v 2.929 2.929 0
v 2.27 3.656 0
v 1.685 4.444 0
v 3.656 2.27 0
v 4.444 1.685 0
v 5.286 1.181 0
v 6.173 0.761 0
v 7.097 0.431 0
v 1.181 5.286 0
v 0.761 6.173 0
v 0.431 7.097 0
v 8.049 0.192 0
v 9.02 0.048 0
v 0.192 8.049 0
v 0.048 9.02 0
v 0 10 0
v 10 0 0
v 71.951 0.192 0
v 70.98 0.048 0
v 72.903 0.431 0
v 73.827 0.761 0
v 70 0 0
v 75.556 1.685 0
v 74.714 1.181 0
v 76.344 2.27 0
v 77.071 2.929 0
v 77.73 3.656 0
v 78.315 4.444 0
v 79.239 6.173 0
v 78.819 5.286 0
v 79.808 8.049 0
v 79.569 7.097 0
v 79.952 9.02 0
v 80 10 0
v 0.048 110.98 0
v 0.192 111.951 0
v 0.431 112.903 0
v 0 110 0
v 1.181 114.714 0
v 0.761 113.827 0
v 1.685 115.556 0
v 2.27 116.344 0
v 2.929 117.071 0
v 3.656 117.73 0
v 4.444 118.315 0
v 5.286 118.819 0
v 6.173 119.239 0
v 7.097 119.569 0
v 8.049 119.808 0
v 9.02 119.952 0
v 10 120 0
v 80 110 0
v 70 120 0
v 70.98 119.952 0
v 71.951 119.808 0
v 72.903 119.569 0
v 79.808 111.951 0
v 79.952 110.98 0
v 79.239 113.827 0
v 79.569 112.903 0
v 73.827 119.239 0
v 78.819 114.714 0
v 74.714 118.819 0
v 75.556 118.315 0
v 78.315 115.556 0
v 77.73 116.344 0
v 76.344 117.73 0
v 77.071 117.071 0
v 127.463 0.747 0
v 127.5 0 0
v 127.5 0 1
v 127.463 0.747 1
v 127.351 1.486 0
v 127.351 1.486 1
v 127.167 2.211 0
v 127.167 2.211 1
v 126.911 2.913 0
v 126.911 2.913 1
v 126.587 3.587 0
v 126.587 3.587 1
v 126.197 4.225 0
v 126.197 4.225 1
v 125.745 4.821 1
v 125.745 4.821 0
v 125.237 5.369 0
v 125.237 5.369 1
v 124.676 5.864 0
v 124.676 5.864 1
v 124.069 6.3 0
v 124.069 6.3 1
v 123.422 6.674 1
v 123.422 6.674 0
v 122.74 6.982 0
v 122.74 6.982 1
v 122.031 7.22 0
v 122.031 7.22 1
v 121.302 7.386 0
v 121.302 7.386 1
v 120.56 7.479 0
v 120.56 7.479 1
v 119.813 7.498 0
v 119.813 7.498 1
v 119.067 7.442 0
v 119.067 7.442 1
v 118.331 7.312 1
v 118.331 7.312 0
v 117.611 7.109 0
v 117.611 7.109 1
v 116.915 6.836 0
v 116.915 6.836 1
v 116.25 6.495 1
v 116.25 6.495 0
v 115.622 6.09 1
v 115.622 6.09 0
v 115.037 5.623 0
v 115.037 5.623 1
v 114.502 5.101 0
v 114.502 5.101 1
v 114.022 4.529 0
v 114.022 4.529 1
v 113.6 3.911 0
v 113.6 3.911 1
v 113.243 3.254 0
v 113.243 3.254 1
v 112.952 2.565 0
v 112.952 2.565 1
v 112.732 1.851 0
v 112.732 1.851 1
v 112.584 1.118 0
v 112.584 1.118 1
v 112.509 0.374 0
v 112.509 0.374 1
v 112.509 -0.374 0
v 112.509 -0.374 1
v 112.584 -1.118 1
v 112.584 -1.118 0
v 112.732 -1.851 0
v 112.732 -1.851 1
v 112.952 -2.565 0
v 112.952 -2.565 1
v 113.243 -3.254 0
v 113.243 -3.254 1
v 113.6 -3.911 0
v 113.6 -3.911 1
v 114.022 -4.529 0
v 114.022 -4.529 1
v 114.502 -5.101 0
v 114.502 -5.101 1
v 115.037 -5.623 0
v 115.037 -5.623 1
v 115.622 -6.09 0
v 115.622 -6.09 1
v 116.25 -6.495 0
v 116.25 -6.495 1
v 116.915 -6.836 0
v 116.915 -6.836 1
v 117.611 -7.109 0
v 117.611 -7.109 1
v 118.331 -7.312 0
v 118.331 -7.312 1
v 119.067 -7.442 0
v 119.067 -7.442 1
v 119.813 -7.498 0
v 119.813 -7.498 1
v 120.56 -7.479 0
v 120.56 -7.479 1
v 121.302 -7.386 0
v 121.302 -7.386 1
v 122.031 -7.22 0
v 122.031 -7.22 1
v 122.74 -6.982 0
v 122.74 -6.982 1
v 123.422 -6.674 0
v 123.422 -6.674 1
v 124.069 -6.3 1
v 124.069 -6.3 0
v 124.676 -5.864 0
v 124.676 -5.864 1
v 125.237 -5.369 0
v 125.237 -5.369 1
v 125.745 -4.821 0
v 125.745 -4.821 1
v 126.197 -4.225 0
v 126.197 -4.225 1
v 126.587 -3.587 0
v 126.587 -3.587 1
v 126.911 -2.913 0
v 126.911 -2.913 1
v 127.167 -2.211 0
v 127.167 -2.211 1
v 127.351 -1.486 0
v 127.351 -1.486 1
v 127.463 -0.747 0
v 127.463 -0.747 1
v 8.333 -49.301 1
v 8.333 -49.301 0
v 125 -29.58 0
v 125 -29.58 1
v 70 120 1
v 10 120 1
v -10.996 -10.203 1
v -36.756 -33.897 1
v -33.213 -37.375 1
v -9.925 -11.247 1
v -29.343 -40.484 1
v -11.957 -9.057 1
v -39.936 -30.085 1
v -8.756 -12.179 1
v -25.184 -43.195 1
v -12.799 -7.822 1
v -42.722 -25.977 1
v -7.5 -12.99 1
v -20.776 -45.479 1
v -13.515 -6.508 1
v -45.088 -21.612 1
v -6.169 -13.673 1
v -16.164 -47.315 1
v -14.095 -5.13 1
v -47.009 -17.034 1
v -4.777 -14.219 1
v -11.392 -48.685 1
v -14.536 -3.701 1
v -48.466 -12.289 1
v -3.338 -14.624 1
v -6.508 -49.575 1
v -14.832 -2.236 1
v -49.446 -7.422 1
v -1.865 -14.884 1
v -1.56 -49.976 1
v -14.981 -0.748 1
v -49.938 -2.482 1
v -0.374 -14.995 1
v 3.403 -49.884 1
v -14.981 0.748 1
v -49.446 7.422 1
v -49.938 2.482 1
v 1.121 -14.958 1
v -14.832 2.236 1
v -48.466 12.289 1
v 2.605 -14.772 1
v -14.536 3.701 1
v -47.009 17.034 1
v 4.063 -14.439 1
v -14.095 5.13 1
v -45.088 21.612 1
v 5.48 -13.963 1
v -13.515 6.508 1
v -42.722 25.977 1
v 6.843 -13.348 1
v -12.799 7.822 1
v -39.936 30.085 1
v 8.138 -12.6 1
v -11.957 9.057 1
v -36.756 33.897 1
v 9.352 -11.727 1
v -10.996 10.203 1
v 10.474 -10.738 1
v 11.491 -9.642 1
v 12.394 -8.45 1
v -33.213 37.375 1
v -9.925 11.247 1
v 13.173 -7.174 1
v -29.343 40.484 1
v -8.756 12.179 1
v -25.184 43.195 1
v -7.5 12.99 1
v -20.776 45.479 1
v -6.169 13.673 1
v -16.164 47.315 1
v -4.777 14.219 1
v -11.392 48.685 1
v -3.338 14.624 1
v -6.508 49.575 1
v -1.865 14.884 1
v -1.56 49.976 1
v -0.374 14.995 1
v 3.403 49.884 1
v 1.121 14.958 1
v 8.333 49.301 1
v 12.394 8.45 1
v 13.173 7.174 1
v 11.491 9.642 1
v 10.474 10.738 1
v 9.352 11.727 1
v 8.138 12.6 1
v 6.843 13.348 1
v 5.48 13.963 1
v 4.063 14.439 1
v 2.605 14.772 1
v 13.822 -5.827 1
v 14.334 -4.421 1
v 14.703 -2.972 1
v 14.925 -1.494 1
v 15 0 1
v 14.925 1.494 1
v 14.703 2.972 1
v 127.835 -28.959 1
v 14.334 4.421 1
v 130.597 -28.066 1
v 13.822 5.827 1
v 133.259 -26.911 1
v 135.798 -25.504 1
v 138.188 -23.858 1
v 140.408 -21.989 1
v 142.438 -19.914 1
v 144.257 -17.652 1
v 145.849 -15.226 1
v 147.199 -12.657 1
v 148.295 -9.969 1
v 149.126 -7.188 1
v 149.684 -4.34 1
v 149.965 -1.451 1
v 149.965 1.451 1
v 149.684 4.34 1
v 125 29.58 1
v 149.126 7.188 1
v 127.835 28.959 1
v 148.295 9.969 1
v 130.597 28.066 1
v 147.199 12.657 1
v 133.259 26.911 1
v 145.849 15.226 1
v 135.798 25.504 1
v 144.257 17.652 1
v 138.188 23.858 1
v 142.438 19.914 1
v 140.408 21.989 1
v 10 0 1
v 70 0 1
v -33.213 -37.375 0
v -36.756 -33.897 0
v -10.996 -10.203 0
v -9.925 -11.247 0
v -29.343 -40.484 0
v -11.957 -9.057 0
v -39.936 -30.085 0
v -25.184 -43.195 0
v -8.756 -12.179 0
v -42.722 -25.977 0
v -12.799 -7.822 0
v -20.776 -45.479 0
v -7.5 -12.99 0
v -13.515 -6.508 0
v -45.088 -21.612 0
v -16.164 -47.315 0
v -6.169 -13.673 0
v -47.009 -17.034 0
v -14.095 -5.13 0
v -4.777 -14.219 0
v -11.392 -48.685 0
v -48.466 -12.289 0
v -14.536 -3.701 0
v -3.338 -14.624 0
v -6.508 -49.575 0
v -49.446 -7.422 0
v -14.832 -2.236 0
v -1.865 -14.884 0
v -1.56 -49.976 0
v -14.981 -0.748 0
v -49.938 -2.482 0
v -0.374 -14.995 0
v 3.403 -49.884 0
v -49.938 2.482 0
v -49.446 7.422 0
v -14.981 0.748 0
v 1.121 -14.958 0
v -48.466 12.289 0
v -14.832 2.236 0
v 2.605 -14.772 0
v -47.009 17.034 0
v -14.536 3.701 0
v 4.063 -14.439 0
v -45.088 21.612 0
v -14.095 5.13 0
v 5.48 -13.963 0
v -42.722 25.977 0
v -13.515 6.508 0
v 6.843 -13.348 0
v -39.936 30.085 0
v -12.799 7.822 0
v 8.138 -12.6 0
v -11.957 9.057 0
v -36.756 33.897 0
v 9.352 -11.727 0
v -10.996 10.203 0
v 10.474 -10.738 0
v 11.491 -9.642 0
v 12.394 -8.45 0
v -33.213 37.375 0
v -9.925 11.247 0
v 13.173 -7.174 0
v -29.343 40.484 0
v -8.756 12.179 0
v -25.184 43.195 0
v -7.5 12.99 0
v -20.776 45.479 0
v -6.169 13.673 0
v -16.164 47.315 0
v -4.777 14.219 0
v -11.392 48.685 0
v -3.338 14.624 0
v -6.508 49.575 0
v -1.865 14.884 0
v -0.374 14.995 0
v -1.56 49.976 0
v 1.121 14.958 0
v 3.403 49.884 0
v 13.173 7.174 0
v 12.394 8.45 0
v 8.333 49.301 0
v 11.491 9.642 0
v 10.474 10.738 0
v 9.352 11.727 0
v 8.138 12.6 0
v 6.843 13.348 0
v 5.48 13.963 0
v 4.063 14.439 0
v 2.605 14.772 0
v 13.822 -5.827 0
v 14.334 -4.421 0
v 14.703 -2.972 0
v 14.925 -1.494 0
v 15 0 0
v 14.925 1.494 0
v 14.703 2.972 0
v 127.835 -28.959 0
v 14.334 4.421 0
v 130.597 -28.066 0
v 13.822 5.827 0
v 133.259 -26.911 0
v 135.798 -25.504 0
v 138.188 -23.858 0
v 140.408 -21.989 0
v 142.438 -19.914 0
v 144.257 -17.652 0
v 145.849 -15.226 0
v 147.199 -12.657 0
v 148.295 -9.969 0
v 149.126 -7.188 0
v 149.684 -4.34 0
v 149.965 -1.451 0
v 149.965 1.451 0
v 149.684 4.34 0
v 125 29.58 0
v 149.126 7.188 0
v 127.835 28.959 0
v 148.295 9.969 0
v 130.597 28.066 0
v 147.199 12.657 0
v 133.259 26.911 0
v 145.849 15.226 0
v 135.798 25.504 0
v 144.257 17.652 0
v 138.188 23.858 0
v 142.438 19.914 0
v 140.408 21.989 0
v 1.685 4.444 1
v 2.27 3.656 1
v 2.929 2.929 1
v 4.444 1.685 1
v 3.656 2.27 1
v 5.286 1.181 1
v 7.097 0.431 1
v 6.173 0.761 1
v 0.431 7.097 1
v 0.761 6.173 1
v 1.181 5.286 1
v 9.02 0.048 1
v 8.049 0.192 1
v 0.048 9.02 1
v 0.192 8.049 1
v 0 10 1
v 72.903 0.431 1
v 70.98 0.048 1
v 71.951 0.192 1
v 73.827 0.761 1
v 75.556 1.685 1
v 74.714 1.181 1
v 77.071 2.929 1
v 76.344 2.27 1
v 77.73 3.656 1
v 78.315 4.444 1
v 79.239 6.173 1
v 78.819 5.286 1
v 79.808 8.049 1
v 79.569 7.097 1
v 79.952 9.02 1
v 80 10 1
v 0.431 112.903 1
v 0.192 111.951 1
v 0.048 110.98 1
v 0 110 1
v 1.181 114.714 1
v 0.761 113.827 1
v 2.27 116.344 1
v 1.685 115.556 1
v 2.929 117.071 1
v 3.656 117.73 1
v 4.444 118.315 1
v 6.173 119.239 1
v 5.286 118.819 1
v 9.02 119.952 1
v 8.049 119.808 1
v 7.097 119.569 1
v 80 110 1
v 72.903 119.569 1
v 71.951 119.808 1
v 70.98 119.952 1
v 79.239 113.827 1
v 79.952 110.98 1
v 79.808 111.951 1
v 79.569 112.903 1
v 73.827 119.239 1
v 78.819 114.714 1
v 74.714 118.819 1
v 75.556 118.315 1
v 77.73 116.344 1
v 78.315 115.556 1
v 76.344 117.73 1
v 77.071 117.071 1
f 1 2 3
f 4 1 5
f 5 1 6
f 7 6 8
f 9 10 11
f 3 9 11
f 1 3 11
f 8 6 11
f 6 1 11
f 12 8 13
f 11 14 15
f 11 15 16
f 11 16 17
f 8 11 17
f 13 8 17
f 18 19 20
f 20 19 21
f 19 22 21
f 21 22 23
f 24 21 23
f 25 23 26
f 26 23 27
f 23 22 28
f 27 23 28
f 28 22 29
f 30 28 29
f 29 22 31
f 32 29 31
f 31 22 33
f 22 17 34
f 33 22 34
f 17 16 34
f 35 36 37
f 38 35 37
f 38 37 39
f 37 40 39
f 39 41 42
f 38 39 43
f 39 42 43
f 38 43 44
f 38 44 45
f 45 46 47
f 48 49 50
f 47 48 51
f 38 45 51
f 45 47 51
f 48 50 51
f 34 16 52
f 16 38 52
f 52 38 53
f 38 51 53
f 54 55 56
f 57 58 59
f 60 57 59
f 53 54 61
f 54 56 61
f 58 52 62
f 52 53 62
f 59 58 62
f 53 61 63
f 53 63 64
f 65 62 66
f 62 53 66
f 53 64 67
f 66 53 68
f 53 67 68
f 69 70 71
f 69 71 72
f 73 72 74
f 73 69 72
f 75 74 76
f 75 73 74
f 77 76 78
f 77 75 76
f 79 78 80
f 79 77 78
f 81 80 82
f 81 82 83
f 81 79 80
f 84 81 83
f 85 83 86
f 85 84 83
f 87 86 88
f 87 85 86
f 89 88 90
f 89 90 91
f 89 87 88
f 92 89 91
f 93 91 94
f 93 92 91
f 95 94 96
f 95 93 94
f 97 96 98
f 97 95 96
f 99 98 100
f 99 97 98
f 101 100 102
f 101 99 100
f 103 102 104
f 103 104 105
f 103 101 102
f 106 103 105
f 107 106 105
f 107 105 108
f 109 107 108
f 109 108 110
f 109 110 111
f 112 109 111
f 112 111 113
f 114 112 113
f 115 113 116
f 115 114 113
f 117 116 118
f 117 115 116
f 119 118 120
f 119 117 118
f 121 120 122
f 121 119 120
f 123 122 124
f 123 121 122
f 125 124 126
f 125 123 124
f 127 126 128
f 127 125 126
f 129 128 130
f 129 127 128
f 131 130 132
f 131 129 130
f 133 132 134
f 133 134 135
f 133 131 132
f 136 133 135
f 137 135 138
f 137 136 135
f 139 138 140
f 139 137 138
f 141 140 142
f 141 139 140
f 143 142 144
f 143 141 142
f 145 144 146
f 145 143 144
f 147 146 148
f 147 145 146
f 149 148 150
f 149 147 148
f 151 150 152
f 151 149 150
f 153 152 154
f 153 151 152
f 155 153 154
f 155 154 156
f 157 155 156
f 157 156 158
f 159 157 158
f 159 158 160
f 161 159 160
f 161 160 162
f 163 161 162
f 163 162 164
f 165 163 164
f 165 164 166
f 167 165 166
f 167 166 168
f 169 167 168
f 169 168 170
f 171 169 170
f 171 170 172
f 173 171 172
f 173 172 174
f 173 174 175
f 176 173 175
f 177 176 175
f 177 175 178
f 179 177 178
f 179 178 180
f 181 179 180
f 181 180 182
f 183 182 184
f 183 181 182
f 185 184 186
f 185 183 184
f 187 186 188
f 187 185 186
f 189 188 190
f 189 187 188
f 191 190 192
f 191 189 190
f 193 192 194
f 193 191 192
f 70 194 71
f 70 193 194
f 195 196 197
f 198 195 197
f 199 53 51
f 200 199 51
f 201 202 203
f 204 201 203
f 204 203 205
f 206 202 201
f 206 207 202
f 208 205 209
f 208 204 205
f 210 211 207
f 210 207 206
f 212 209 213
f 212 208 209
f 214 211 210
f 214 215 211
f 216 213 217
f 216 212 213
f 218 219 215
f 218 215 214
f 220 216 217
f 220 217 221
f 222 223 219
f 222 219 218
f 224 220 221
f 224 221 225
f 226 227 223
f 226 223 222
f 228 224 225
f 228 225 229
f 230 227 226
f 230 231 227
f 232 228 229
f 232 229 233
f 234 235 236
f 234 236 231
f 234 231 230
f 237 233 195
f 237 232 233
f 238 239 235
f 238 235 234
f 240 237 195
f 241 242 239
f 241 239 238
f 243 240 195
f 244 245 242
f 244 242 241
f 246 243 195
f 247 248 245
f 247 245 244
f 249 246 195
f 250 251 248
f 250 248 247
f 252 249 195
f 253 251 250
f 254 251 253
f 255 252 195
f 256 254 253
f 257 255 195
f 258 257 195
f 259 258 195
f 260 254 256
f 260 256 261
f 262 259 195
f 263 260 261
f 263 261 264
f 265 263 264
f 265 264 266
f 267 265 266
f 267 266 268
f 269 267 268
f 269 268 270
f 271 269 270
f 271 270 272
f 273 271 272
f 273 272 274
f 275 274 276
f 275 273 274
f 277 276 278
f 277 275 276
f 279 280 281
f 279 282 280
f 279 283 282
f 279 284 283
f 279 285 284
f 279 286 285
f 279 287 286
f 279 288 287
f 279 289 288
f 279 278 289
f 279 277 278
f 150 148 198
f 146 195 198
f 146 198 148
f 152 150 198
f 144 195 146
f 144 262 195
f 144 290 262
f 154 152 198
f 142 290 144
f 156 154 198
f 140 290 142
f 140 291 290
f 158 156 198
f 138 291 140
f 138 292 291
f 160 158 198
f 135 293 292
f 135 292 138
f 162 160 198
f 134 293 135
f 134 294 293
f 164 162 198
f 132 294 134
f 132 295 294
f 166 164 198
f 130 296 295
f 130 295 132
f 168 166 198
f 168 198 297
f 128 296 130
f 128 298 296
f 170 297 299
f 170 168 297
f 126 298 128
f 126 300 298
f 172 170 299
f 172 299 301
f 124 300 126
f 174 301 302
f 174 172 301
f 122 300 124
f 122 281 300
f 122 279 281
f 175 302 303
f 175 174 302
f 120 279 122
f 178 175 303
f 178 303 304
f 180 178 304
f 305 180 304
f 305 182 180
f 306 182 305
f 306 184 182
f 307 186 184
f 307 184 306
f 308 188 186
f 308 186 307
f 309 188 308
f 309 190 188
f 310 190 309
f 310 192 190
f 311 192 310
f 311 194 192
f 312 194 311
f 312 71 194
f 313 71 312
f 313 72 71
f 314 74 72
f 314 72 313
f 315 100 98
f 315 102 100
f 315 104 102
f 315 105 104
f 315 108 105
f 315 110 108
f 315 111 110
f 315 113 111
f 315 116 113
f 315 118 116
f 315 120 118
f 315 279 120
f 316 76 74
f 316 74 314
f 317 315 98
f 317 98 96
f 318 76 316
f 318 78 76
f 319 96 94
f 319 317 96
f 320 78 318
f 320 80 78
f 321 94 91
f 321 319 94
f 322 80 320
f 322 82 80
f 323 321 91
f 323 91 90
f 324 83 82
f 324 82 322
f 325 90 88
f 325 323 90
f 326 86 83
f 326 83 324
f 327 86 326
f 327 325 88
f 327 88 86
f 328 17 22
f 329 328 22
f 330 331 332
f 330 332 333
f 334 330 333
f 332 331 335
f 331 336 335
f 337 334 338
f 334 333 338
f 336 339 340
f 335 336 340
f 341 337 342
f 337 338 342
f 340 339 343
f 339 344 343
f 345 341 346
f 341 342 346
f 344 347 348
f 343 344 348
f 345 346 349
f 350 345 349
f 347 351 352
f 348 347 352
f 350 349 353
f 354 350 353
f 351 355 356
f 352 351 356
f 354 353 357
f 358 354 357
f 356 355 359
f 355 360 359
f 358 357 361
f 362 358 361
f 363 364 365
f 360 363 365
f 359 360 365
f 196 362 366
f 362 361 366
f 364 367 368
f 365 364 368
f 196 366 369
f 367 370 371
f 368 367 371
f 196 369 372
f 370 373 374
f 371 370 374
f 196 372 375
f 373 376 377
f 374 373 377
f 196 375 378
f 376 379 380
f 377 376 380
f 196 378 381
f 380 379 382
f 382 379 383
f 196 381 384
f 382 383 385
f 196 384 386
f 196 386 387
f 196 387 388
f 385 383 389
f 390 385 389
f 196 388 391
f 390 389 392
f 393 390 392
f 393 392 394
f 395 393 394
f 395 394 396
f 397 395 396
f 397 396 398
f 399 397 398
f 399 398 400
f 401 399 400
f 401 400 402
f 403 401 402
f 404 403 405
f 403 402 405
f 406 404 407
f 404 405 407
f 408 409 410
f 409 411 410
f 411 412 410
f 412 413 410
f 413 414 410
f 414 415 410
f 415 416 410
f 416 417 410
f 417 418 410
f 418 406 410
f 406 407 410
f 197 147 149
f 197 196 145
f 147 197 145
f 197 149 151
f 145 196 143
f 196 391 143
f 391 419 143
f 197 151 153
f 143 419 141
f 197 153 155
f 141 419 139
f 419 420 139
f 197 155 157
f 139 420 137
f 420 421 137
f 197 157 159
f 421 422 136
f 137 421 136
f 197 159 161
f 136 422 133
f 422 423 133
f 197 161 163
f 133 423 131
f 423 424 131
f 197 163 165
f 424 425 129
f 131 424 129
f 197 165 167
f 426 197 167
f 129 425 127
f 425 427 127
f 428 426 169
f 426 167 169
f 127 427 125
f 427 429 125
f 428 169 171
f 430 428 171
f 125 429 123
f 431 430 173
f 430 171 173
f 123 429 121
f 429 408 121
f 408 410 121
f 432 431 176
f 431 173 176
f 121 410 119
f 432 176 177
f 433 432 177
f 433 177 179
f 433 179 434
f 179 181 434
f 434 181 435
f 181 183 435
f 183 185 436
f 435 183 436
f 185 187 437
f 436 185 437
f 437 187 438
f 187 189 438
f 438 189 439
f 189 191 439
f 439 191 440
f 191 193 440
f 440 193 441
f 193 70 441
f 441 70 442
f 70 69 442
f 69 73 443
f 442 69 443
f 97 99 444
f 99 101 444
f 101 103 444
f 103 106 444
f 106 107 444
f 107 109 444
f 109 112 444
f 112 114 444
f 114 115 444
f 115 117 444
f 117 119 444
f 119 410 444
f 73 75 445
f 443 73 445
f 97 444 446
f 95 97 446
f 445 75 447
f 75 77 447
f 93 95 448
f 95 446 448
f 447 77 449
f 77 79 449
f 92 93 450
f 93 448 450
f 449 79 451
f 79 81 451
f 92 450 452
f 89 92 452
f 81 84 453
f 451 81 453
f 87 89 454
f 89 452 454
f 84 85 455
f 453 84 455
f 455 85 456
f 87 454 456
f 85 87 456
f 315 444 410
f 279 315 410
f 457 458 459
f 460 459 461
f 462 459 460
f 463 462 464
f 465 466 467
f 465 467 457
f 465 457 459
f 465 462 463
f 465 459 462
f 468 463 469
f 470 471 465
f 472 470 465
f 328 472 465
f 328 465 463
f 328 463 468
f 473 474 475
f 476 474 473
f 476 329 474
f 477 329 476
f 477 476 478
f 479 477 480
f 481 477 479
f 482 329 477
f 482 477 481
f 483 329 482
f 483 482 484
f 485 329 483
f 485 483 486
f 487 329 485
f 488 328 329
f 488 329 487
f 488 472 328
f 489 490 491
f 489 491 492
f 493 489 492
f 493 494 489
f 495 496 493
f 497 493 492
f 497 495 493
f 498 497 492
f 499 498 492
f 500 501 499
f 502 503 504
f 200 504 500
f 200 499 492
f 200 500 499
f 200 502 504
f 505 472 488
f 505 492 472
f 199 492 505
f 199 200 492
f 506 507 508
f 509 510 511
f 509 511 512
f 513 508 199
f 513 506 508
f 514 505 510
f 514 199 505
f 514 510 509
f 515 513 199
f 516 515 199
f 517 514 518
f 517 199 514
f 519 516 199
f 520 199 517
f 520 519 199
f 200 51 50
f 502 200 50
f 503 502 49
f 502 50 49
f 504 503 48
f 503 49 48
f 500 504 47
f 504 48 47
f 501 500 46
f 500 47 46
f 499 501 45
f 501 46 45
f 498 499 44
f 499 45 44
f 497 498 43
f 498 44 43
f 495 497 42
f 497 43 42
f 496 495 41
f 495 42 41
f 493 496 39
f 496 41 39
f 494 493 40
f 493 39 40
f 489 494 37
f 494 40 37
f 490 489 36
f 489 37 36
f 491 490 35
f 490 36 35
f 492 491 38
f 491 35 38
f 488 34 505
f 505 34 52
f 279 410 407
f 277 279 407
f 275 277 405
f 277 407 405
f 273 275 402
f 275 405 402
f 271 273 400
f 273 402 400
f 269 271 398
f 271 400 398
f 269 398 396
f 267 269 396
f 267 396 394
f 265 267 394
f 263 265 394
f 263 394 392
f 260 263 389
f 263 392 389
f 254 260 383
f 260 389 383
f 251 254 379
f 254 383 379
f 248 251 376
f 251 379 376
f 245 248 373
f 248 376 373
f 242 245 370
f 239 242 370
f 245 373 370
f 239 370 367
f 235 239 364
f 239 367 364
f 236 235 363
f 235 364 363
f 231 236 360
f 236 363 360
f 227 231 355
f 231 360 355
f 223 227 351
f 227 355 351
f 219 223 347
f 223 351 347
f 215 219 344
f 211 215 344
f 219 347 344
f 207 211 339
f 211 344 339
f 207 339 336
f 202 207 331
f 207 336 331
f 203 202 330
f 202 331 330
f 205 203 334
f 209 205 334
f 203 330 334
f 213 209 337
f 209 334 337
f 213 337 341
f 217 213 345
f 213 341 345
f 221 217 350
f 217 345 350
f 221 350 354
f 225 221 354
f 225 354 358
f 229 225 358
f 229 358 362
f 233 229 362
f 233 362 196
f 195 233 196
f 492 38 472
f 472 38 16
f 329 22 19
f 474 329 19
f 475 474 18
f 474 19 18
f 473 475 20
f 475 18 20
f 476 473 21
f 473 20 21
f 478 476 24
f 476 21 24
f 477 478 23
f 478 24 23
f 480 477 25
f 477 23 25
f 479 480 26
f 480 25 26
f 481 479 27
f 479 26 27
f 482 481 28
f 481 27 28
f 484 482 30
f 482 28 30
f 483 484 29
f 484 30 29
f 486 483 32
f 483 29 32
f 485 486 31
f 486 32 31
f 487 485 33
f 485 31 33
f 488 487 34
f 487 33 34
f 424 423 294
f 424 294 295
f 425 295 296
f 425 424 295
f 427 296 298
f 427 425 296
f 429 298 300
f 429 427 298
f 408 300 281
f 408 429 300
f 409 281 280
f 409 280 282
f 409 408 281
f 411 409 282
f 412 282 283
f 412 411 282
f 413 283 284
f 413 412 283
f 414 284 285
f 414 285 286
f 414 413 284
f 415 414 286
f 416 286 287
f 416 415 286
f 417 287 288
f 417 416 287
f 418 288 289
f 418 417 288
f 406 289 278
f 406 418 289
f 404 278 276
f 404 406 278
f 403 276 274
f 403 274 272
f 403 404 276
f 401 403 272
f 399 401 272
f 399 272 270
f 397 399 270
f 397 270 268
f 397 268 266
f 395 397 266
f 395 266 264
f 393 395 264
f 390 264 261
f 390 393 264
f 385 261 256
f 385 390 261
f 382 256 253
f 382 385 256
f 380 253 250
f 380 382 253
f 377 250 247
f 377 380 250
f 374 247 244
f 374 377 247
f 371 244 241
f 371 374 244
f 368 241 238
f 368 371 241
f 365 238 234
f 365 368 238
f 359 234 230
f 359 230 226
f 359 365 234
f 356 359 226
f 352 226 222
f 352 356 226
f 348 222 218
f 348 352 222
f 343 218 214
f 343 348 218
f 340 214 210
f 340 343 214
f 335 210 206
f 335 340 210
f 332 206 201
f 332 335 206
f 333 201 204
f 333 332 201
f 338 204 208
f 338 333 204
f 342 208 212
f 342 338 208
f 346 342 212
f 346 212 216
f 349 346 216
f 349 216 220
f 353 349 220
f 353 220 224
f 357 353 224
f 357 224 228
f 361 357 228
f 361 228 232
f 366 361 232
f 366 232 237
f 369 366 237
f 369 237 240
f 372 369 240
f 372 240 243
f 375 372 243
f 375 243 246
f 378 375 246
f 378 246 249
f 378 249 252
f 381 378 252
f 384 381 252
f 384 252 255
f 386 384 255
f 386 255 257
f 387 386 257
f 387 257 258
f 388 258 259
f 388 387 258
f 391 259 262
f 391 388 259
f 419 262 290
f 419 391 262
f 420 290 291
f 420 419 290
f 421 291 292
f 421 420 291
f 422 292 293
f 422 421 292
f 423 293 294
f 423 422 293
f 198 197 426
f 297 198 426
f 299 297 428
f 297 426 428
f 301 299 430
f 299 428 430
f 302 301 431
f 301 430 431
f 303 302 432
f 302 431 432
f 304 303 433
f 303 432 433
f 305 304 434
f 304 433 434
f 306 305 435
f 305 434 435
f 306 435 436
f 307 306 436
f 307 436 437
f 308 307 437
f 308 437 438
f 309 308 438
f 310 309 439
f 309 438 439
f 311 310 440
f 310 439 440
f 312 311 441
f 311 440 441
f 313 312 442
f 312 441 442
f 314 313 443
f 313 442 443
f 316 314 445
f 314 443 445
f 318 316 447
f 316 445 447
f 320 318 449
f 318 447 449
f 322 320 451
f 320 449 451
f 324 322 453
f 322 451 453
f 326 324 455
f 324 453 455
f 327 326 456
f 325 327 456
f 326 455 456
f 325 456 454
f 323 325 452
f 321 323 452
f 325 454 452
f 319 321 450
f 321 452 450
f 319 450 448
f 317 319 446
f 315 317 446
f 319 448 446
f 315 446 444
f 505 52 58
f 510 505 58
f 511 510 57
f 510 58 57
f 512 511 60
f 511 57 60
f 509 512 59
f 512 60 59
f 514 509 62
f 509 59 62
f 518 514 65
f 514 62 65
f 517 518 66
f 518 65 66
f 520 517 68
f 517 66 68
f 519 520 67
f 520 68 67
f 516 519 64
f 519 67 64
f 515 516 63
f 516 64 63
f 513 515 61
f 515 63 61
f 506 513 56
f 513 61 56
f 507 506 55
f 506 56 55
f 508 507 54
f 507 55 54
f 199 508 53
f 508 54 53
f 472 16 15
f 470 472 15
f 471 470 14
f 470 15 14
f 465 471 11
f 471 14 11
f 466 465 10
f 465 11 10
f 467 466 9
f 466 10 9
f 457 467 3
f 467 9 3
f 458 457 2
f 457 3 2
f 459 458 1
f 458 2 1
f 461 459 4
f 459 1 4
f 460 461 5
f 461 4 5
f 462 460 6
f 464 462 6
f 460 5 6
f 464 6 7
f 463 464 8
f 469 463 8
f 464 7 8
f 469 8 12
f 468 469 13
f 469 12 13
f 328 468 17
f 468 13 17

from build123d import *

# Parameters (mm, degrees)
F1_DEPTH = 1
F2_R     = 15
F2_R_2   = 7.5
F3_DEPTH = 1


with BuildPart() as f1:
    # F0 (on Top) → F1 (new body)
    with BuildSketch(Plane.XY):
        with BuildLine():
            ThreePointArc((0, 10), (2.928932, 2.928932), (10, 0))
            Line((10, 0), (70, 0))
            ThreePointArc((70, 0), (77.071068, 2.928932), (80, 10))
            Line((80, 10), (80, 110))
            ThreePointArc((80, 110), (77.071068, 117.071068), (70, 120))
            Line((70, 120), (10, 120))
            ThreePointArc((10, 120), (2.928932, 117.071068), (0, 110))
            Line((0, 110), (0, 10))
        make_face()
    extrude(amount=F1_DEPTH)


with BuildPart() as f3:
    # F2 (on Top) → F3 (new body)
    with BuildSketch(Plane.XY):
        with BuildLine():
            Line((125, 29.580399), (8.333333, 49.300665))
            ThreePointArc((8.333333, 49.300665), (-50, 0), (8.333333, -49.300665))
            Line((8.333333, -49.300665), (125, -29.580399))
            ThreePointArc((125, -29.580399), (150, 0), (125, 29.580399))
        make_face()
        Circle(F2_R, mode=Mode.SUBTRACT)
        with Locations((120, 0)):
            Circle(F2_R_2, mode=Mode.SUBTRACT)
    extrude(amount=F3_DEPTH)


solid = Compound([f1.part, f3.part])
